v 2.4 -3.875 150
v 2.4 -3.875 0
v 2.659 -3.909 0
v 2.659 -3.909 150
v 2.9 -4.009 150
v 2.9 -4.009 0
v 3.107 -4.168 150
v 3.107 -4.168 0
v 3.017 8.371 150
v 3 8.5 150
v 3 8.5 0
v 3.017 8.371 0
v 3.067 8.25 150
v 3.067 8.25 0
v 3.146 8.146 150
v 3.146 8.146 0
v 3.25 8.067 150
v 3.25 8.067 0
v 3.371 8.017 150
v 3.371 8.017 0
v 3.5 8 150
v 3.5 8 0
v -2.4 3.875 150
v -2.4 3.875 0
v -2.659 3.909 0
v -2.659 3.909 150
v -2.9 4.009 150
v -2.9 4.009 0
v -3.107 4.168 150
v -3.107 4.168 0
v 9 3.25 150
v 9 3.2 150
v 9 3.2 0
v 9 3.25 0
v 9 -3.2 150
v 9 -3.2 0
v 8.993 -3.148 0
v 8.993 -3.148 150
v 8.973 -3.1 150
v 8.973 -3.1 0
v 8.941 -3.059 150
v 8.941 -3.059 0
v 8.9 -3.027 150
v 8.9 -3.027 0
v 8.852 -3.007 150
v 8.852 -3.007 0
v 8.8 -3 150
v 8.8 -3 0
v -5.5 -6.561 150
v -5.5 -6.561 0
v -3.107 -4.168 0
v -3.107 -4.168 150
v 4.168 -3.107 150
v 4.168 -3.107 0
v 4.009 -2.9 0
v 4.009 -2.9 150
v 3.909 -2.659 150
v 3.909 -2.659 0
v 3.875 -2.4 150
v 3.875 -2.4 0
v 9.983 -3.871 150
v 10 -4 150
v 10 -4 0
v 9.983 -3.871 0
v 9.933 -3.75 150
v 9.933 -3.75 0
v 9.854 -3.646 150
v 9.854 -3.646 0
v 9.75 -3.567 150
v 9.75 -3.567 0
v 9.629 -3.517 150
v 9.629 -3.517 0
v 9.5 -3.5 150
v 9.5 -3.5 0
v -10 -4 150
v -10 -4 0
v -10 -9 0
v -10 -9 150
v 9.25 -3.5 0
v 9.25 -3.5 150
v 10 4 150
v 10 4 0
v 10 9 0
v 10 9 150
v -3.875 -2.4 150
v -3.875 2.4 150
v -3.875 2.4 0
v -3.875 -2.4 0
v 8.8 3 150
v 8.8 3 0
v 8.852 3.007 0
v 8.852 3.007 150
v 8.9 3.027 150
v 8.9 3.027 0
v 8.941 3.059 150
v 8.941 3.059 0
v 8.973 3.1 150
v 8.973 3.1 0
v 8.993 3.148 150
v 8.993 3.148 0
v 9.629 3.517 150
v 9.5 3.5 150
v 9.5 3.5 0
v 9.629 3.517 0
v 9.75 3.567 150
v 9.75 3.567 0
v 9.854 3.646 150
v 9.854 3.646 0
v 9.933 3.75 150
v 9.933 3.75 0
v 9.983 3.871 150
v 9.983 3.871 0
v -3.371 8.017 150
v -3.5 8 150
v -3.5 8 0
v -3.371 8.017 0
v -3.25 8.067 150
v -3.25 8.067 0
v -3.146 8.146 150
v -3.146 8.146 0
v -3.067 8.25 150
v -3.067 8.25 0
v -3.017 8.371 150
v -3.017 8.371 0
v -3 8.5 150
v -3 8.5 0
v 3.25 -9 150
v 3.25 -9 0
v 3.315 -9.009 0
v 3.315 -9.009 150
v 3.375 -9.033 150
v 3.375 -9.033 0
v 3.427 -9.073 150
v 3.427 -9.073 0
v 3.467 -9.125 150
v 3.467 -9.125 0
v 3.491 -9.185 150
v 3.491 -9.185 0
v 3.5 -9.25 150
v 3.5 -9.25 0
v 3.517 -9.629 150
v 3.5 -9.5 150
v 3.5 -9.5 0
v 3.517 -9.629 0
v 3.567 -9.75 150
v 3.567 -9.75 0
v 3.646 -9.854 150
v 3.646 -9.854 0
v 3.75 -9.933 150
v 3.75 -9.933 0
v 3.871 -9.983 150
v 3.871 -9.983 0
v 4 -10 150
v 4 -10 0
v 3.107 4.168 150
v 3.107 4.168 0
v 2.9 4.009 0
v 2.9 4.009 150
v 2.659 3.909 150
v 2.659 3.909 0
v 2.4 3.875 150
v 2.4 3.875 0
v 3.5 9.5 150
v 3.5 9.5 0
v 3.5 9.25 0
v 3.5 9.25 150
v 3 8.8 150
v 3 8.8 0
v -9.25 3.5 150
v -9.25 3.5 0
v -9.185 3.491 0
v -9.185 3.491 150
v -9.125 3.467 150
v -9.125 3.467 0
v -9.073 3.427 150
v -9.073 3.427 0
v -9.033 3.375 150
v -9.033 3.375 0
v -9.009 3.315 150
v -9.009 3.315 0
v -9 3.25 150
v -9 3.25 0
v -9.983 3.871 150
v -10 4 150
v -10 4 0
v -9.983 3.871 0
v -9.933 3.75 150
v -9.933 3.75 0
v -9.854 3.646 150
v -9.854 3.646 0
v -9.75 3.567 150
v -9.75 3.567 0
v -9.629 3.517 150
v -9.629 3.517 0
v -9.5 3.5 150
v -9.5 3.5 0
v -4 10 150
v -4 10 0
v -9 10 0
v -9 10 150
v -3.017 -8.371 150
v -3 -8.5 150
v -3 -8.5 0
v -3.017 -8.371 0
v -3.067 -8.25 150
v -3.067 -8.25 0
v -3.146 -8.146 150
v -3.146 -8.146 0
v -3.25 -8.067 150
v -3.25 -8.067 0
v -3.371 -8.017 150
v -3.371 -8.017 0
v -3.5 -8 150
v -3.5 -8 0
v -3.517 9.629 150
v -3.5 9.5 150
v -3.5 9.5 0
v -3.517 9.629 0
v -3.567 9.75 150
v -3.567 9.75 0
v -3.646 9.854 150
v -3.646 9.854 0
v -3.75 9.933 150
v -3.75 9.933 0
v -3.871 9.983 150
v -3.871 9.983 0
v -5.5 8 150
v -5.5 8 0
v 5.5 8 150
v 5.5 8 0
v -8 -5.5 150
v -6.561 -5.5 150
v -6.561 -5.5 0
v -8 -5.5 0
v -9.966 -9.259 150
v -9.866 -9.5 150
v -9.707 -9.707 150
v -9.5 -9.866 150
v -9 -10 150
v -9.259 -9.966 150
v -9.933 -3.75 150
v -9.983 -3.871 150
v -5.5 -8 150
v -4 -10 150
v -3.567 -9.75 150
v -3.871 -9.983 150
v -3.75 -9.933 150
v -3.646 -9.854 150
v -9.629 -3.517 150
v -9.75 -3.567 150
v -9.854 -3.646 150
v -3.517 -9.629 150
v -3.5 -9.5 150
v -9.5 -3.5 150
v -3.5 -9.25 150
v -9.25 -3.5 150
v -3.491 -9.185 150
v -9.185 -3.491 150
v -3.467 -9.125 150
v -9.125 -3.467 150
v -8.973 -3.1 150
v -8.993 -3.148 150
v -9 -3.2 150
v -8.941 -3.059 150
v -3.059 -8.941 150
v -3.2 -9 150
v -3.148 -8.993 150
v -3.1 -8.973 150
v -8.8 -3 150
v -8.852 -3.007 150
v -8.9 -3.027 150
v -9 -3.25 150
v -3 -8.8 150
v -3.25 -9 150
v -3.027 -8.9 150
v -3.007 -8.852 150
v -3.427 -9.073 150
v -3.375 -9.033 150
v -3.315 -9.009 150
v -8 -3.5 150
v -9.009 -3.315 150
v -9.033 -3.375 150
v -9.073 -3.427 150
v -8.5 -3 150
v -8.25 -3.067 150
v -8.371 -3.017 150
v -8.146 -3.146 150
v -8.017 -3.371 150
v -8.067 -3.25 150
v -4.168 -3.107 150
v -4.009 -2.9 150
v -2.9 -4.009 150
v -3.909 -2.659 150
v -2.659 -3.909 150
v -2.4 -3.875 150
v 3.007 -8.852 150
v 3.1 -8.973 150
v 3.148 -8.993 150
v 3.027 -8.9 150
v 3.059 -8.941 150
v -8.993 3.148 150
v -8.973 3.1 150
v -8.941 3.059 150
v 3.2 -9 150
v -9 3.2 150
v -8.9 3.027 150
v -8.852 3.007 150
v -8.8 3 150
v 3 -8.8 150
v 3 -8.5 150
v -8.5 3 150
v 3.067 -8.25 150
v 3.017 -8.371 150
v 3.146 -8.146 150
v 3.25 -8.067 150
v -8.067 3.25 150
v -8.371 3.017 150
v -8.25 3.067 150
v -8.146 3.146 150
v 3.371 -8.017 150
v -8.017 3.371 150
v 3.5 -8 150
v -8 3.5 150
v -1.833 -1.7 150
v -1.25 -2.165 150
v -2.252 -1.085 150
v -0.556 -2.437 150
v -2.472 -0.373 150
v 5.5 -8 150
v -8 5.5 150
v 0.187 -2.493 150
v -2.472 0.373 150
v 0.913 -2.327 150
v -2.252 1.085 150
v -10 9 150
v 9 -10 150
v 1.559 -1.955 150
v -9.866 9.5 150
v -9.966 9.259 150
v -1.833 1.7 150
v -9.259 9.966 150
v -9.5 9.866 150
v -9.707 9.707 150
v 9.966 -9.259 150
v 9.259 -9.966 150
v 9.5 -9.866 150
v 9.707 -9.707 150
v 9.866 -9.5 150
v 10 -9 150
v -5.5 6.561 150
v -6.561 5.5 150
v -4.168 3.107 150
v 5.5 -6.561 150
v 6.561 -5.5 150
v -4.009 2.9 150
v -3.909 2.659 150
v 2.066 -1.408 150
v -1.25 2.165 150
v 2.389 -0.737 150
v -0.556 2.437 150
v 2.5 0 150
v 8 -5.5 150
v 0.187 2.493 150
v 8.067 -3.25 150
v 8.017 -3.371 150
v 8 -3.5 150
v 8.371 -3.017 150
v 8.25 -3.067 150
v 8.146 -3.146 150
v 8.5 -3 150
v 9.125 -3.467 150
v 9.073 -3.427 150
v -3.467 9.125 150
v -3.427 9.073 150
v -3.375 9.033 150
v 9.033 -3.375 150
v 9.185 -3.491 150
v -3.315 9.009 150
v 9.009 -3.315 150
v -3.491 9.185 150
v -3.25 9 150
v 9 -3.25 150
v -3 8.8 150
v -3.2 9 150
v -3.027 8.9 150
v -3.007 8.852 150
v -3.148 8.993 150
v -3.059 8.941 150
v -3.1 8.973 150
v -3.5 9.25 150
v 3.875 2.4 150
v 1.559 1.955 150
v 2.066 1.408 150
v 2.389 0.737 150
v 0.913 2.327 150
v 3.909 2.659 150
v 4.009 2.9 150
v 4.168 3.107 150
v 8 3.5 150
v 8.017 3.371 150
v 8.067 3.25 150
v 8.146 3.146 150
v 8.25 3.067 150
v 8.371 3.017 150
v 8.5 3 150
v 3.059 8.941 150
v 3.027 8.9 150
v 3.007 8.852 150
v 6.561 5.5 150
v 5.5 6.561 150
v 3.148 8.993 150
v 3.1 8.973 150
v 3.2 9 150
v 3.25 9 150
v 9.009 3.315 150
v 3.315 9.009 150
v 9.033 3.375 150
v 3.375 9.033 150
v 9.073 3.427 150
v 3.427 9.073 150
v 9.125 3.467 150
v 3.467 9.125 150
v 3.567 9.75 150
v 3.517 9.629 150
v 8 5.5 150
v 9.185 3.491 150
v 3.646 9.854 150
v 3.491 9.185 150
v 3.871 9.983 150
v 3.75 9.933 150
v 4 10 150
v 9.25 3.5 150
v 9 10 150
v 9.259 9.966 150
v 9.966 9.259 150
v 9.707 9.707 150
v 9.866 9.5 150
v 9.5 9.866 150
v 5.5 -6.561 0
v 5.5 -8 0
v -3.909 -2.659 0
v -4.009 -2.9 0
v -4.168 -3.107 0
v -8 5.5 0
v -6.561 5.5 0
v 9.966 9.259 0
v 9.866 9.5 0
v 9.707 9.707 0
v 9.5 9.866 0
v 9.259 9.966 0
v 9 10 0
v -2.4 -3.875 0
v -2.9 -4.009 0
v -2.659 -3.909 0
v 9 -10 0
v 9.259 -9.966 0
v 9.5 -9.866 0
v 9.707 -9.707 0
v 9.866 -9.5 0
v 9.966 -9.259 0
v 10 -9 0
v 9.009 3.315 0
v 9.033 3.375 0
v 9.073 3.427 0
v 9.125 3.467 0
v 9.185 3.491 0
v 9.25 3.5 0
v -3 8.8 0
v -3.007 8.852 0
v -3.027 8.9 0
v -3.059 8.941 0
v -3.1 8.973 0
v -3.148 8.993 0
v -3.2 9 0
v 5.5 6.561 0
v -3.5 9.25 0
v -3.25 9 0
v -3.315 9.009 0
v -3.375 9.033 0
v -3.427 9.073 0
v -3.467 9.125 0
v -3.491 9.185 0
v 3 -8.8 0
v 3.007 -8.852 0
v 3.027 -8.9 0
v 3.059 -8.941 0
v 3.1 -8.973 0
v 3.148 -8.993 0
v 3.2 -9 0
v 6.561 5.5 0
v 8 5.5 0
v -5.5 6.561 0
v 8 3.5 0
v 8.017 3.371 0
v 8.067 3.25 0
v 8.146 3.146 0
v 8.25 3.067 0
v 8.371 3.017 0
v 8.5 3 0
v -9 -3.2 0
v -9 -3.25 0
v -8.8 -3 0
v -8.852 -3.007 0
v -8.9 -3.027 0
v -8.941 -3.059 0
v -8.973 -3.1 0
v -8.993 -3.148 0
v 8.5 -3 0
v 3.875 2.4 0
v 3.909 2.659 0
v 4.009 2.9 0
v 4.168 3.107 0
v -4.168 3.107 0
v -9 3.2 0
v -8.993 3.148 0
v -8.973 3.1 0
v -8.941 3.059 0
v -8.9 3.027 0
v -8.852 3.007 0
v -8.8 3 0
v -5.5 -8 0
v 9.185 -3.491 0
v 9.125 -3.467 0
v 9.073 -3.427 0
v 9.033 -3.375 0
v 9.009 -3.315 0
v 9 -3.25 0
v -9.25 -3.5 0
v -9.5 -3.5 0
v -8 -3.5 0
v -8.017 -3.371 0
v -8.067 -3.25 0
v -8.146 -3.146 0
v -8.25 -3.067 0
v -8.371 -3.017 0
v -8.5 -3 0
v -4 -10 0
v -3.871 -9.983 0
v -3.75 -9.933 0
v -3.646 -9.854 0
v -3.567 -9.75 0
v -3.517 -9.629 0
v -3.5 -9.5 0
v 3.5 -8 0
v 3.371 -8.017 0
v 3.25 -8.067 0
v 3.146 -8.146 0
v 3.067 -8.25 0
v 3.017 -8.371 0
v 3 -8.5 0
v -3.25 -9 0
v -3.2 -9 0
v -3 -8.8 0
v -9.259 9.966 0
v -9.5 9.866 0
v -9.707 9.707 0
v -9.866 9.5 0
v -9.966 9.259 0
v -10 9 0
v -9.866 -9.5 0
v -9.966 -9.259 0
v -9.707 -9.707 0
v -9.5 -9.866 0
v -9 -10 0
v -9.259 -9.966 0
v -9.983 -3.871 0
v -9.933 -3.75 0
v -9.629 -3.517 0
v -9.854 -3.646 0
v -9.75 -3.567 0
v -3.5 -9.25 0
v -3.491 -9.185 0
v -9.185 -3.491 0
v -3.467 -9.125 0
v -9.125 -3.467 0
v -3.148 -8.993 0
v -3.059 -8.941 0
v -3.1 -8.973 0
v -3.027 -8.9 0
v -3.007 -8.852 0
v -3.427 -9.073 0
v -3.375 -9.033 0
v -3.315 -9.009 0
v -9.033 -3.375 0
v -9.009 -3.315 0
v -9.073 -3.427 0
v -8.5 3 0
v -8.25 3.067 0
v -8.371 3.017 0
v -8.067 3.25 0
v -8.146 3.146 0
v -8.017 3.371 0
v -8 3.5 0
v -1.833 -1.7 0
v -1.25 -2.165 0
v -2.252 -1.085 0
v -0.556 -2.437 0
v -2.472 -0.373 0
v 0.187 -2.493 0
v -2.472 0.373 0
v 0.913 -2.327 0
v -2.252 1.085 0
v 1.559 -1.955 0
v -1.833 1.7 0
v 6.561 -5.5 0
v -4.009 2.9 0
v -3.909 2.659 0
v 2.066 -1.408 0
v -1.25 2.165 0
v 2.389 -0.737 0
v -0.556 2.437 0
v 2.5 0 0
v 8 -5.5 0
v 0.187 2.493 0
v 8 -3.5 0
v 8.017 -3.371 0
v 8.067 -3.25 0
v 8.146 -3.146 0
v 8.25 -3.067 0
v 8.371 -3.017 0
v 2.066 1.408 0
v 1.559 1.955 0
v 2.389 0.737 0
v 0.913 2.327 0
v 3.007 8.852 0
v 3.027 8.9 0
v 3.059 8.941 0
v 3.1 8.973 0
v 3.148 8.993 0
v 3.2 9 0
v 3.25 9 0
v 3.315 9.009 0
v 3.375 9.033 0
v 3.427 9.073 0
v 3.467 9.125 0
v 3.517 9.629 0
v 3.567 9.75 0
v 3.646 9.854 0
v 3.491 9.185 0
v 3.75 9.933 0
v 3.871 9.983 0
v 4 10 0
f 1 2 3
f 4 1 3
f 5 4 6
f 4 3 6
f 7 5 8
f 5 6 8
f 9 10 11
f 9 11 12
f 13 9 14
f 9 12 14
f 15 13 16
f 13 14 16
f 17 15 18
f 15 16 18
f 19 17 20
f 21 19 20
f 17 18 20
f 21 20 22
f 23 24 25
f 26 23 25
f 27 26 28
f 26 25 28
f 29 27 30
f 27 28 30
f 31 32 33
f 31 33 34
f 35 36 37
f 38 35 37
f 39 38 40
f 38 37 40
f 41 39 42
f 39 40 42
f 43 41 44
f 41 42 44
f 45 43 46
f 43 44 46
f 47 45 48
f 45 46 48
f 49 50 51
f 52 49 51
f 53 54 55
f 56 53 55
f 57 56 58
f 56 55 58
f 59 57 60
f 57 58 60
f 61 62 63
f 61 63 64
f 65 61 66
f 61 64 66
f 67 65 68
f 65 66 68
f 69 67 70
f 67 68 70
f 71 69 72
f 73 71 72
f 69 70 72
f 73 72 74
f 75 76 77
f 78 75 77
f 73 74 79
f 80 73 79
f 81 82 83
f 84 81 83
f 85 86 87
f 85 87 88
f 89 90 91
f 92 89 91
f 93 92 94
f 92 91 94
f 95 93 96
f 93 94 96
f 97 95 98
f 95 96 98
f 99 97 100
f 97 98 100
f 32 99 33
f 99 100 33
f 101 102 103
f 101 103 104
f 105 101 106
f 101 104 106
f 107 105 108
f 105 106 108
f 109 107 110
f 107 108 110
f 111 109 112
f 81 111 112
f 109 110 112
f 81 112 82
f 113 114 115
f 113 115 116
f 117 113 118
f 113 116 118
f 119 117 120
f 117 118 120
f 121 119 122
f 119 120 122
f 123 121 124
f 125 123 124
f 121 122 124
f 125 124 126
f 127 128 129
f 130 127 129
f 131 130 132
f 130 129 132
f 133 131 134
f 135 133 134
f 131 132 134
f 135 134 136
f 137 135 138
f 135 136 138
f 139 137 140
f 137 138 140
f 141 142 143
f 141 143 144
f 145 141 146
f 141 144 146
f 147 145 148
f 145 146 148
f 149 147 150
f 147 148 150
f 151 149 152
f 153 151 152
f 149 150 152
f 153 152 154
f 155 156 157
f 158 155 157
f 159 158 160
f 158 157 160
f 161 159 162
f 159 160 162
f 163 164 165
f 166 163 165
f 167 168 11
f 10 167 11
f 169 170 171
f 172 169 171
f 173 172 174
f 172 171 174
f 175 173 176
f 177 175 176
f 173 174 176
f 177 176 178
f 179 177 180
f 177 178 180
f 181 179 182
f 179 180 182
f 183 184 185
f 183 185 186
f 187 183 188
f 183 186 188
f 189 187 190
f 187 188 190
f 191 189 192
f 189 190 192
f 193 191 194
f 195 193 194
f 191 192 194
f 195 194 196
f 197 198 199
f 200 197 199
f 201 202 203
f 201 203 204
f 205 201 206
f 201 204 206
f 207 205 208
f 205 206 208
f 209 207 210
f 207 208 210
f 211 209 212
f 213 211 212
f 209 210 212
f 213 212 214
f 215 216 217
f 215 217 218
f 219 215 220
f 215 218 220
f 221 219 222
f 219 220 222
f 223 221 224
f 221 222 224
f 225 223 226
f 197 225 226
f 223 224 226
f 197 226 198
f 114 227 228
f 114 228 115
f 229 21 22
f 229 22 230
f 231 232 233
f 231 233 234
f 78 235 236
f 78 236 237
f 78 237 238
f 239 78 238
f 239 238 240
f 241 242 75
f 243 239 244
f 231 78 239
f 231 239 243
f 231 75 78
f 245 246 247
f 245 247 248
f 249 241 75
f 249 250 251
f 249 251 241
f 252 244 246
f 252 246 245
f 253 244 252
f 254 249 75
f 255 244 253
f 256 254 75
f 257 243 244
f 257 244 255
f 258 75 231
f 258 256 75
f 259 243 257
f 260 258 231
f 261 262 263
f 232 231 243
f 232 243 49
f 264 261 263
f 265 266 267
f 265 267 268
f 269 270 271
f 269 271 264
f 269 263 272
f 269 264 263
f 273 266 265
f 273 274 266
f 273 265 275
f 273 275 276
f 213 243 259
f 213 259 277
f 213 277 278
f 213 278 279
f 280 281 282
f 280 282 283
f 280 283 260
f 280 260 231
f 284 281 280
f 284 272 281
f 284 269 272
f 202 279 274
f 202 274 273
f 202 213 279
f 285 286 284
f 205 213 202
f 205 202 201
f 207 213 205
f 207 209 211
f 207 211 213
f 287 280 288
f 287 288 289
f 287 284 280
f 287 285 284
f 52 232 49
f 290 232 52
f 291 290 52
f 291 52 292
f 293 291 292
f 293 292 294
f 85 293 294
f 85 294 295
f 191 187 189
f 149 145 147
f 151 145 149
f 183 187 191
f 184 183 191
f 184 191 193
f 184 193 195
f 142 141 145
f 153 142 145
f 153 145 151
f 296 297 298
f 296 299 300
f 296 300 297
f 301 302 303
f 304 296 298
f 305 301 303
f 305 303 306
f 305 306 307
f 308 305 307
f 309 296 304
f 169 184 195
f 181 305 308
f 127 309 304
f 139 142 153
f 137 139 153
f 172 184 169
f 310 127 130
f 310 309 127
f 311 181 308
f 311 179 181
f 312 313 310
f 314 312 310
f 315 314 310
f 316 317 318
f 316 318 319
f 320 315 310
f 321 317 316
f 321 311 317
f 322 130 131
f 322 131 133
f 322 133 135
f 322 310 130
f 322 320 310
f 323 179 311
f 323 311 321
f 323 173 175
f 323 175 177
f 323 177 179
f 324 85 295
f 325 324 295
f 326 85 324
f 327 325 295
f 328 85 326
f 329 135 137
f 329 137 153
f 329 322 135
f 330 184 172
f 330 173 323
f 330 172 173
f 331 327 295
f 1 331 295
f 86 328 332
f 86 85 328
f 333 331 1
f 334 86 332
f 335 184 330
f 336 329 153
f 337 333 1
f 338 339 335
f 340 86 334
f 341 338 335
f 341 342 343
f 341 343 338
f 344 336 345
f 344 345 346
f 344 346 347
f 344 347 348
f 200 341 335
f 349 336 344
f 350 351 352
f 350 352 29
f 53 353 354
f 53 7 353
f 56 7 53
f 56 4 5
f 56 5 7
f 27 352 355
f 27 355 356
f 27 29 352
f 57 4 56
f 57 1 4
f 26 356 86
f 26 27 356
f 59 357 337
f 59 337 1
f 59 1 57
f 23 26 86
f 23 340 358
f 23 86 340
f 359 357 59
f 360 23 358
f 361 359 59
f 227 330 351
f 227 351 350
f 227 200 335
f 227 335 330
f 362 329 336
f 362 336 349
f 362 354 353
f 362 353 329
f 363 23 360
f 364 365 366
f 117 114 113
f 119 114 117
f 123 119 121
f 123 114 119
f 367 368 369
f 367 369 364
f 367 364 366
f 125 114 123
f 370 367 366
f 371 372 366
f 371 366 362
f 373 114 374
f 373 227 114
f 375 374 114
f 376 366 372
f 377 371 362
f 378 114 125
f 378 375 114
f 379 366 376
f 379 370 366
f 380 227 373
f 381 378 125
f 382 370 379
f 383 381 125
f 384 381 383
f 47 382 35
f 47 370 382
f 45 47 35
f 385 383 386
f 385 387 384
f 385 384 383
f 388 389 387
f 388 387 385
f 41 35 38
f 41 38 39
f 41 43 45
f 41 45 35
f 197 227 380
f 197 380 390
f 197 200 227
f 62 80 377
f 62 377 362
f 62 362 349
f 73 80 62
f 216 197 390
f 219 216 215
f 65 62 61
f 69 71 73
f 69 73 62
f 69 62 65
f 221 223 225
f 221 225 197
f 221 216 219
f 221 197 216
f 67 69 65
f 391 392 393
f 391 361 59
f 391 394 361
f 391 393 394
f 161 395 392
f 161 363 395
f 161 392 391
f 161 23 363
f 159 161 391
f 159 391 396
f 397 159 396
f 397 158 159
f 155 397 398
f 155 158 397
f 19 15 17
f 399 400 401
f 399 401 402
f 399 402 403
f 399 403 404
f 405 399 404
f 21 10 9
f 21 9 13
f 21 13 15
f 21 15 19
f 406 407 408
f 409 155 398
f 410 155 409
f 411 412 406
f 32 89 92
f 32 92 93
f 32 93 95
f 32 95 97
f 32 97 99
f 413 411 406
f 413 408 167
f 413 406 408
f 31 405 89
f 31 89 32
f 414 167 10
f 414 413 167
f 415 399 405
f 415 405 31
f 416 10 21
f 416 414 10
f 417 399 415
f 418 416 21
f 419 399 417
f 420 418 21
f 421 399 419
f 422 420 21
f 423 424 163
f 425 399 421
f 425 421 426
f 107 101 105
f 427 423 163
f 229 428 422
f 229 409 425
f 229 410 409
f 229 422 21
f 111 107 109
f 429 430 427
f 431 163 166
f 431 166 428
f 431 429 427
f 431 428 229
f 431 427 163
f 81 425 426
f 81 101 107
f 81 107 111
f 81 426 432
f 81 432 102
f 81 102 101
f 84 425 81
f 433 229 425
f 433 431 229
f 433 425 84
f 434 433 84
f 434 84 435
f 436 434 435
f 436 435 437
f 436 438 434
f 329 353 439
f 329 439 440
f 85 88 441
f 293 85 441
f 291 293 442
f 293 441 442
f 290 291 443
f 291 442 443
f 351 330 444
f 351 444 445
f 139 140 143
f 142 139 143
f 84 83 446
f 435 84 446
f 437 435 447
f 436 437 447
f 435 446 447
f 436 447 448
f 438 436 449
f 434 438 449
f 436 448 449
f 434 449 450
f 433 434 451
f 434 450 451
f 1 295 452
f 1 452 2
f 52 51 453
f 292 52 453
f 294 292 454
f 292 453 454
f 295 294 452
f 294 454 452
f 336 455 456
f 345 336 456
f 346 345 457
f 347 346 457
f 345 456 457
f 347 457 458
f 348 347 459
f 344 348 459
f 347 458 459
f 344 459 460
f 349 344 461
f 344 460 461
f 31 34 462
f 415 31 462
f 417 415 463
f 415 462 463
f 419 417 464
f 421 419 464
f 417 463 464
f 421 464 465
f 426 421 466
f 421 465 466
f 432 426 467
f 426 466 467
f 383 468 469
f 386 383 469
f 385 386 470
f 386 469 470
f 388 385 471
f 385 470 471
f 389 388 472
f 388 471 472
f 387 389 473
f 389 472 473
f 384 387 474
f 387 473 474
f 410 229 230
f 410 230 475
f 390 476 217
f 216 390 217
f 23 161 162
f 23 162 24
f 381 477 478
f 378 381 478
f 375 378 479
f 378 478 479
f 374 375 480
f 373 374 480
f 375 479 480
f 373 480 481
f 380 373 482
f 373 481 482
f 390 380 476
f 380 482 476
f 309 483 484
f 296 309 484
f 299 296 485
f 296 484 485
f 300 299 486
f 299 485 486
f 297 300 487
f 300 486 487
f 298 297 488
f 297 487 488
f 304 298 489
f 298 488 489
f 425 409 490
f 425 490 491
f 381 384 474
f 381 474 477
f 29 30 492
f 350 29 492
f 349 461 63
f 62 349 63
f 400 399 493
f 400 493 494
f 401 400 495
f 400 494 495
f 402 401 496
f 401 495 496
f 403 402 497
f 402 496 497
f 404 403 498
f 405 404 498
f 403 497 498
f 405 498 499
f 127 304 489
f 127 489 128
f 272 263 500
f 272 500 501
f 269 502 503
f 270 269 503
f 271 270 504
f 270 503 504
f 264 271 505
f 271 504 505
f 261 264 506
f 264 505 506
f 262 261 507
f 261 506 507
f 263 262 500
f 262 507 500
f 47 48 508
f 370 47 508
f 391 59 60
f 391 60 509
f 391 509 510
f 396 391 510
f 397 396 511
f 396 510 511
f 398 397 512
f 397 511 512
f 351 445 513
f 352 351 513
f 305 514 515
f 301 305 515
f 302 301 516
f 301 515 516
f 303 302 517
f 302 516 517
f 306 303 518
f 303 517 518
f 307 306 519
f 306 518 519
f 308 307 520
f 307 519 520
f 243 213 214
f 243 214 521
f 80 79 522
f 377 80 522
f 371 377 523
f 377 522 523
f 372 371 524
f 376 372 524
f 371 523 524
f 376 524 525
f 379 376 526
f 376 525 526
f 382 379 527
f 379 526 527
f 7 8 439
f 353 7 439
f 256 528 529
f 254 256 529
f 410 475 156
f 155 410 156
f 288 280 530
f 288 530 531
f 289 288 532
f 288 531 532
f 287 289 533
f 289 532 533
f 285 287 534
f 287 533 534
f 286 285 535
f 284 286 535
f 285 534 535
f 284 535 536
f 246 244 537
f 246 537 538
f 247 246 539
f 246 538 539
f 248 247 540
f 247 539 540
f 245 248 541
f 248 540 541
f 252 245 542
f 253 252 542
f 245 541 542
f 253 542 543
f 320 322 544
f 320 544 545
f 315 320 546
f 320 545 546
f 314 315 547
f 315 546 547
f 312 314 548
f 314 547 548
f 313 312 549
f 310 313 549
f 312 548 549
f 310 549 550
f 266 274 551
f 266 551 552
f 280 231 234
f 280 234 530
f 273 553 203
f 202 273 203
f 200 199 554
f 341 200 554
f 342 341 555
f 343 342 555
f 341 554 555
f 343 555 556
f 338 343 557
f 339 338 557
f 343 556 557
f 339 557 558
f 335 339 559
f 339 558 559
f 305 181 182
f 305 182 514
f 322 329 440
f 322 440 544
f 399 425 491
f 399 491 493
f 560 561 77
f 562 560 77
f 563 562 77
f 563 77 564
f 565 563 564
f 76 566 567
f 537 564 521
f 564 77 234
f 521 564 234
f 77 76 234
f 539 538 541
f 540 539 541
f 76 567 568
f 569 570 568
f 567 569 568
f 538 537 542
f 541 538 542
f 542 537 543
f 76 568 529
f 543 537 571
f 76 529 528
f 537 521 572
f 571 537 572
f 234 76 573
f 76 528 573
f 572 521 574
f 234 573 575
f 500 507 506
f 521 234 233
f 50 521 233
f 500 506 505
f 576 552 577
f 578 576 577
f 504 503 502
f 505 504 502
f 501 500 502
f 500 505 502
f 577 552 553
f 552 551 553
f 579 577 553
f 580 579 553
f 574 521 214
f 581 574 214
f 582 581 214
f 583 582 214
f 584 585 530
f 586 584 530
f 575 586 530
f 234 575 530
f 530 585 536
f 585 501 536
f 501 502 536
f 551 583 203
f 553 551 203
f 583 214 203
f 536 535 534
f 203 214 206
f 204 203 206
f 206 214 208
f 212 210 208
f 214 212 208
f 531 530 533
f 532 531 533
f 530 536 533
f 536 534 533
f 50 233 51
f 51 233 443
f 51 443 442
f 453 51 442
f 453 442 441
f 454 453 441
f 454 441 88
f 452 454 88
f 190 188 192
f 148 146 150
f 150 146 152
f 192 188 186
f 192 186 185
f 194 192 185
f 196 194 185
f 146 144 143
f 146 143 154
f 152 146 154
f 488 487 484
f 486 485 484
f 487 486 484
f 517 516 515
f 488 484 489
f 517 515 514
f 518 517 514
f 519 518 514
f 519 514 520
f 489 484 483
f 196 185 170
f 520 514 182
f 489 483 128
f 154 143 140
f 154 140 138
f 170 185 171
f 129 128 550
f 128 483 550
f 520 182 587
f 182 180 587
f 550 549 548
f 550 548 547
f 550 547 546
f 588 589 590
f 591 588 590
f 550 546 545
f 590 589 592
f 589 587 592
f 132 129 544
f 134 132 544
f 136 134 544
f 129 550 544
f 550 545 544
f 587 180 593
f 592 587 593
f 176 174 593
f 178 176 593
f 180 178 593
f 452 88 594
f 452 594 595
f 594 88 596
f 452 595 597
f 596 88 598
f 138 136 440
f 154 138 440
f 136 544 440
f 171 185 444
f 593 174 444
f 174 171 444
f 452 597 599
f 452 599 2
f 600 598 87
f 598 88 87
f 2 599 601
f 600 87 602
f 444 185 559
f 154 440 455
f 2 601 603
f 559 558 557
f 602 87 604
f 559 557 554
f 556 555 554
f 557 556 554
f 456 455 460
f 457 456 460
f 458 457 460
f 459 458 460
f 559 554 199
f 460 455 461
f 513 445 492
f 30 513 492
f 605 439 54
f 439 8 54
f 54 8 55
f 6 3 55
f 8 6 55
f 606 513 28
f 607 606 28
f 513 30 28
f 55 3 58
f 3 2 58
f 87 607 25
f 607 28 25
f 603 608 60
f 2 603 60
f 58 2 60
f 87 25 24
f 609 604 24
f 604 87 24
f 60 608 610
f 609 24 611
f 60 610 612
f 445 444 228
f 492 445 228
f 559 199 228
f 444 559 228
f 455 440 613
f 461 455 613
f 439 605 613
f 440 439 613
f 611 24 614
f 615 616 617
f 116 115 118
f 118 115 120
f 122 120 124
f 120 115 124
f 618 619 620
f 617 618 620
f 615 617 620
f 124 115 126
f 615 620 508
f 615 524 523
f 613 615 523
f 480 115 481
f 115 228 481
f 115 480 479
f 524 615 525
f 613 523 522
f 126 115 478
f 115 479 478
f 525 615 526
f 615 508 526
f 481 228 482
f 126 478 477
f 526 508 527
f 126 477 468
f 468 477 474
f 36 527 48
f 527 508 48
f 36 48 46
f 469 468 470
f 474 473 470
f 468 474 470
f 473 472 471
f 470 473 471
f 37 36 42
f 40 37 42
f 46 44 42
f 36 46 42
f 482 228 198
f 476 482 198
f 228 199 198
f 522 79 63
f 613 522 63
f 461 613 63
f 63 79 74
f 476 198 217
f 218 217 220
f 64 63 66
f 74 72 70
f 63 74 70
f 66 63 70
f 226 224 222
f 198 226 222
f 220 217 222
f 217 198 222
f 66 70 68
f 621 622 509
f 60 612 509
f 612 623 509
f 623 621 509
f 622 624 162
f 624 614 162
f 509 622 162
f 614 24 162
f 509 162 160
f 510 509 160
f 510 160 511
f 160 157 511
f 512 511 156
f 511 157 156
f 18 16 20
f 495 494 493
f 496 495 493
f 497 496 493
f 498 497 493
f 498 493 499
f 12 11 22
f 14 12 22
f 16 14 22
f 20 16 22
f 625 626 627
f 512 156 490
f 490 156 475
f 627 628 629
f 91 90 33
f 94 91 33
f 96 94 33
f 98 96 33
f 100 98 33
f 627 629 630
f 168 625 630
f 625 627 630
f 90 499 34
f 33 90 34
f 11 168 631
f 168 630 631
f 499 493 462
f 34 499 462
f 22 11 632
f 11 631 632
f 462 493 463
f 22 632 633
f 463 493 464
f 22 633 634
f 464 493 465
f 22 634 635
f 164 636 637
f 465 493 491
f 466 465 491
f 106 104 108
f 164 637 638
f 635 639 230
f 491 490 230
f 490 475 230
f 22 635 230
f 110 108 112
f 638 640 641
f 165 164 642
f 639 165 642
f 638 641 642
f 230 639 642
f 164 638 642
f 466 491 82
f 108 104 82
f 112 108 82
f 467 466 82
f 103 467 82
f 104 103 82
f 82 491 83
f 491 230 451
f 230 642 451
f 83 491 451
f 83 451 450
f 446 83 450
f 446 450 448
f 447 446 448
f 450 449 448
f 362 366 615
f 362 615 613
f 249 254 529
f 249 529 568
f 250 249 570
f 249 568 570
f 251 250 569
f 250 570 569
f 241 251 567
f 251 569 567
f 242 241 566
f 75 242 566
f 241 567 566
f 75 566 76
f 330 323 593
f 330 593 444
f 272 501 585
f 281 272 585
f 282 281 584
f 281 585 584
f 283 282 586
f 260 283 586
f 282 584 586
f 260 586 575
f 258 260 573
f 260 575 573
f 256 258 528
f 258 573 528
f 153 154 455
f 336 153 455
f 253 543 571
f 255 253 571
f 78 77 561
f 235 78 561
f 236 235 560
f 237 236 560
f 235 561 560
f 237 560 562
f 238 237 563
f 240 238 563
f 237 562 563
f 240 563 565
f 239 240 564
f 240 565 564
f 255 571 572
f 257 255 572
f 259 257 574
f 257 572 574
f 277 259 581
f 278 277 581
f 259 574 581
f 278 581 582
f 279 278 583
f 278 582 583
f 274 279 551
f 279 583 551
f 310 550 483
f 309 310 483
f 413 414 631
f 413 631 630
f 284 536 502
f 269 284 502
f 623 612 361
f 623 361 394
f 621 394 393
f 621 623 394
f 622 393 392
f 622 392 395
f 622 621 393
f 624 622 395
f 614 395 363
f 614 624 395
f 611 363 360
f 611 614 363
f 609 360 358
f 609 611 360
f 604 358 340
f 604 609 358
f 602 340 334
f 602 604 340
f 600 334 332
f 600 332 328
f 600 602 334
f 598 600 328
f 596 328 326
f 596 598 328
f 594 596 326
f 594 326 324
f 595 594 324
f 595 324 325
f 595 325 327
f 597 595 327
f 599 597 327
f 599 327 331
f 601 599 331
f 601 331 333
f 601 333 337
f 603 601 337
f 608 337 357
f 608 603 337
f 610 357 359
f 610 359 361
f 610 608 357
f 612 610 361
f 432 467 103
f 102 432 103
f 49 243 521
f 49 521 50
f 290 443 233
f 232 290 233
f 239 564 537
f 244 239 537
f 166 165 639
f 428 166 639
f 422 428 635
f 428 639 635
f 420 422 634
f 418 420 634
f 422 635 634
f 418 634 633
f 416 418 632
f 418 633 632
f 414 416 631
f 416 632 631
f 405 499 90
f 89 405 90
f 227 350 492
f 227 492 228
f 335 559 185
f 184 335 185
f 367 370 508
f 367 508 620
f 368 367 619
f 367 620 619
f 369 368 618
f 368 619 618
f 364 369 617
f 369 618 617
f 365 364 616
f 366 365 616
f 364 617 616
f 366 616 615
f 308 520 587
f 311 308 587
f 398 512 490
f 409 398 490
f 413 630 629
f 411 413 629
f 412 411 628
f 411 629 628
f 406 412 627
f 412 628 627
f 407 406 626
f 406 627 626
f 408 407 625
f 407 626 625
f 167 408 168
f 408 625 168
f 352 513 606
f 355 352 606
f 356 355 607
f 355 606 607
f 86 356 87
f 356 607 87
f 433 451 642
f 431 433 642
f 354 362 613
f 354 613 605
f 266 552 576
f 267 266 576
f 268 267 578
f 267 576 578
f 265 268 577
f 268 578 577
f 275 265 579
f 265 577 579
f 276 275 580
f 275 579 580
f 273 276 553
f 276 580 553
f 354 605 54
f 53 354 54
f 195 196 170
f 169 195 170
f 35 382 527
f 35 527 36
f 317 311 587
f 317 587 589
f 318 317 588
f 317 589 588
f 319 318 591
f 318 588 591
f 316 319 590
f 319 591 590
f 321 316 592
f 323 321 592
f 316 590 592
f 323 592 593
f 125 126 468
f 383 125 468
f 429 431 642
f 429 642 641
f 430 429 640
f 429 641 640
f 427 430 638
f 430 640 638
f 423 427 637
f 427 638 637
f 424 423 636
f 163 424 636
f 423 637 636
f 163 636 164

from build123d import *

# Parameters (mm, degrees)
SKETCH2_R           = 2.5
BOSS_EXTRUDE1_DEPTH = 150


with BuildPart() as part:
    # Sketch2 → Boss-Extrude1 (new body)
    with BuildSketch(Plane.XY):
        with BuildLine():
            ThreePointArc((4, 10), (3.646446609, 9.853553391), (3.5, 9.5))
            Line((3.5, 9.5), (3.5, 9.25))
            ThreePointArc((3.5, 9.25), (3.426776695, 9.073223305), (3.25, 9))
            Line((3.25, 9), (3.2, 9))
            ThreePointArc((3.2, 9), (3.058578644, 8.941421356), (3, 8.8))
            Line((3, 8.8), (3, 8.5))
            ThreePointArc((3, 8.5), (3.146446609, 8.146446609), (3.5, 8))
            Line((3.5, 8), (5.5, 8))
            Line((5.5, 8), (5.5, 6.560660172))
            Line((5.5, 6.560660172), (3.107233047, 4.167893219))
            ThreePointArc((3.107233047, 4.167893219), (2.782809698, 3.951120467), (2.400126266, 3.875))
            Line((2.400126266, 3.875), (0, 3.875))
            Line((0, 3.875), (-2.400126266, 3.875))
            ThreePointArc((-2.400126266, 3.875), (-2.782809698, 3.951120467), (-3.107233047, 4.167893219))
            Line((-3.107233047, 4.167893219), (-5.5, 6.560660172))
            Line((-5.5, 6.560660172), (-5.5, 8))
            Line((-5.5, 8), (-3.5, 8))
            ThreePointArc((-3.5, 8), (-3.146446609, 8.146446609), (-3, 8.5))
            Line((-3, 8.5), (-3, 8.8))
            ThreePointArc((-3, 8.8), (-3.058578644, 8.941421356), (-3.2, 9))
            Line((-3.2, 9), (-3.25, 9))
            ThreePointArc((-3.25, 9), (-3.426776695, 9.073223305), (-3.5, 9.25))
            Line((-3.5, 9.25), (-3.5, 9.5))
            ThreePointArc((-3.5, 9.5), (-3.646446609, 9.853553391), (-4, 10))
            Line((-4, 10), (-9, 10))
            ThreePointArc((-9, 10), (-9.707106781, 9.707106781), (-10, 9))
            Line((-10, 9), (-10, 4))
            ThreePointArc((-10, 4), (-9.853553391, 3.646446609), (-9.5, 3.5))
            Line((-9.5, 3.5), (-9.25, 3.5))
            ThreePointArc((-9.25, 3.5), (-9.073223305, 3.426776695), (-9, 3.25))
            Line((-9, 3.25), (-9, 3.2))
            ThreePointArc((-9, 3.2), (-8.941421356, 3.058578644), (-8.8, 3))
            Line((-8.8, 3), (-8.5, 3))
            ThreePointArc((-8.5, 3), (-8.146446609, 3.146446609), (-8, 3.5))
            Line((-8, 3.5), (-8, 5.5))
            Line((-8, 5.5), (-6.560660172, 5.5))
            Line((-6.560660172, 5.5), (-4.167893219, 3.107233047))
            ThreePointArc((-4.167893219, 3.107233047), (-3.951120467, 2.782809698), (-3.875, 2.400126266))
            Line((-3.875, 2.400126266), (-3.875, 0))
            Line((-3.875, 0), (-3.875, -2.400126266))
            ThreePointArc((-3.875, -2.400126266), (-3.951120467, -2.782809698), (-4.167893219, -3.107233047))
            Line((-4.167893219, -3.107233047), (-6.560660172, -5.5))
            Line((-6.560660172, -5.5), (-8, -5.5))
            Line((-8, -5.5), (-8, -3.5))
            ThreePointArc((-8, -3.5), (-8.146446609, -3.146446609), (-8.5, -3))
            Line((-8.5, -3), (-8.8, -3))
            ThreePointArc((-8.8, -3), (-8.941421356, -3.058578644), (-9, -3.2))
            Line((-9, -3.2), (-9, -3.25))
            ThreePointArc((-9, -3.25), (-9.073223305, -3.426776695), (-9.25, -3.5))
            Line((-9.25, -3.5), (-9.5, -3.5))
            ThreePointArc((-9.5, -3.5), (-9.853553391, -3.646446609), (-10, -4))
            Line((-10, -4), (-10, -9))
            ThreePointArc((-10, -9), (-9.707106781, -9.707106781), (-9, -10))
            Line((-9, -10), (-4, -10))
            ThreePointArc((-4, -10), (-3.646446609, -9.853553391), (-3.5, -9.5))
            Line((-3.5, -9.5), (-3.5, -9.25))
            ThreePointArc((-3.5, -9.25), (-3.426776695, -9.073223305), (-3.25, -9))
            Line((-3.25, -9), (-3.2, -9))
            ThreePointArc((-3.2, -9), (-3.058578644, -8.941421356), (-3, -8.8))
            Line((-3, -8.8), (-3, -8.5))
            ThreePointArc((-3, -8.5), (-3.146446609, -8.146446609), (-3.5, -8))
            Line((-3.5, -8), (-5.5, -8))
            Line((-5.5, -8), (-5.5, -6.560660172))
            Line((-5.5, -6.560660172), (-3.107233047, -4.167893219))
            ThreePointArc((-3.107233047, -4.167893219), (-2.782809698, -3.951120467), (-2.400126266, -3.875))
            Line((-2.400126266, -3.875), (0, -3.875))
            Line((0, -3.875), (2.400126266, -3.875))
            ThreePointArc((2.400126266, -3.875), (2.782809698, -3.951120467), (3.107233047, -4.167893219))
            Line((3.107233047, -4.167893219), (5.5, -6.560660172))
            Line((5.5, -6.560660172), (5.5, -8))
            Line((5.5, -8), (3.5, -8))
            ThreePointArc((3.5, -8), (3.146446609, -8.146446609), (3, -8.5))
            Line((3, -8.5), (3, -8.8))
            ThreePointArc((3, -8.8), (3.058578644, -8.941421356), (3.2, -9))
            Line((3.2, -9), (3.25, -9))
            ThreePointArc((3.25, -9), (3.426776695, -9.073223305), (3.5, -9.25))
            Line((3.5, -9.25), (3.5, -9.5))
            ThreePointArc((3.5, -9.5), (3.646446609, -9.853553391), (4, -10))
            Line((4, -10), (9, -10))
            ThreePointArc((9, -10), (9.707106781, -9.707106781), (10, -9))
            Line((10, -9), (10, -4))
            ThreePointArc((10, -4), (9.853553391, -3.646446609), (9.5, -3.5))
            Line((9.5, -3.5), (9.25, -3.5))
            ThreePointArc((9.25, -3.5), (9.073223305, -3.426776695), (9, -3.25))
            Line((9, -3.25), (9, -3.2))
            ThreePointArc((9, -3.2), (8.941421356, -3.058578644), (8.8, -3))
            Line((8.8, -3), (8.5, -3))
            ThreePointArc((8.5, -3), (8.146446609, -3.146446609), (8, -3.5))
            Line((8, -3.5), (8, -5.5))
            Line((8, -5.5), (6.560660172, -5.5))
            Line((6.560660172, -5.5), (4.167893219, -3.107233047))
            ThreePointArc((4.167893219, -3.107233047), (3.951120467, -2.782809698), (3.875, -2.400126266))
            Line((3.875, -2.400126266), (3.875, 0))
            Line((3.875, 0), (3.875, 2.400126266))
            ThreePointArc((3.875, 2.400126266), (3.951120467, 2.782809698), (4.167893219, 3.107233047))
            Line((4.167893219, 3.107233047), (6.560660172, 5.5))
            Line((6.560660172, 5.5), (8, 5.5))
            Line((8, 5.5), (8, 3.5))
            ThreePointArc((8, 3.5), (8.146446609, 3.146446609), (8.5, 3))
            Line((8.5, 3), (8.8, 3))
            ThreePointArc((8.8, 3), (8.941421356, 3.058578644), (9, 3.2))
            Line((9, 3.2), (9, 3.25))
            ThreePointArc((9, 3.25), (9.073223305, 3.426776695), (9.25, 3.5))
            Line((9.25, 3.5), (9.5, 3.5))
            ThreePointArc((9.5, 3.5), (9.853553391, 3.646446609), (10, 4))
            Line((10, 4), (10, 9))
            ThreePointArc((10, 9), (9.707106781, 9.707106781), (9, 10))
            Line((9, 10), (4, 10))
        make_face()
        Circle(SKETCH2_R, mode=Mode.SUBTRACT)
    extrude(amount=BOSS_EXTRUDE1_DEPTH)


solid = part.part
